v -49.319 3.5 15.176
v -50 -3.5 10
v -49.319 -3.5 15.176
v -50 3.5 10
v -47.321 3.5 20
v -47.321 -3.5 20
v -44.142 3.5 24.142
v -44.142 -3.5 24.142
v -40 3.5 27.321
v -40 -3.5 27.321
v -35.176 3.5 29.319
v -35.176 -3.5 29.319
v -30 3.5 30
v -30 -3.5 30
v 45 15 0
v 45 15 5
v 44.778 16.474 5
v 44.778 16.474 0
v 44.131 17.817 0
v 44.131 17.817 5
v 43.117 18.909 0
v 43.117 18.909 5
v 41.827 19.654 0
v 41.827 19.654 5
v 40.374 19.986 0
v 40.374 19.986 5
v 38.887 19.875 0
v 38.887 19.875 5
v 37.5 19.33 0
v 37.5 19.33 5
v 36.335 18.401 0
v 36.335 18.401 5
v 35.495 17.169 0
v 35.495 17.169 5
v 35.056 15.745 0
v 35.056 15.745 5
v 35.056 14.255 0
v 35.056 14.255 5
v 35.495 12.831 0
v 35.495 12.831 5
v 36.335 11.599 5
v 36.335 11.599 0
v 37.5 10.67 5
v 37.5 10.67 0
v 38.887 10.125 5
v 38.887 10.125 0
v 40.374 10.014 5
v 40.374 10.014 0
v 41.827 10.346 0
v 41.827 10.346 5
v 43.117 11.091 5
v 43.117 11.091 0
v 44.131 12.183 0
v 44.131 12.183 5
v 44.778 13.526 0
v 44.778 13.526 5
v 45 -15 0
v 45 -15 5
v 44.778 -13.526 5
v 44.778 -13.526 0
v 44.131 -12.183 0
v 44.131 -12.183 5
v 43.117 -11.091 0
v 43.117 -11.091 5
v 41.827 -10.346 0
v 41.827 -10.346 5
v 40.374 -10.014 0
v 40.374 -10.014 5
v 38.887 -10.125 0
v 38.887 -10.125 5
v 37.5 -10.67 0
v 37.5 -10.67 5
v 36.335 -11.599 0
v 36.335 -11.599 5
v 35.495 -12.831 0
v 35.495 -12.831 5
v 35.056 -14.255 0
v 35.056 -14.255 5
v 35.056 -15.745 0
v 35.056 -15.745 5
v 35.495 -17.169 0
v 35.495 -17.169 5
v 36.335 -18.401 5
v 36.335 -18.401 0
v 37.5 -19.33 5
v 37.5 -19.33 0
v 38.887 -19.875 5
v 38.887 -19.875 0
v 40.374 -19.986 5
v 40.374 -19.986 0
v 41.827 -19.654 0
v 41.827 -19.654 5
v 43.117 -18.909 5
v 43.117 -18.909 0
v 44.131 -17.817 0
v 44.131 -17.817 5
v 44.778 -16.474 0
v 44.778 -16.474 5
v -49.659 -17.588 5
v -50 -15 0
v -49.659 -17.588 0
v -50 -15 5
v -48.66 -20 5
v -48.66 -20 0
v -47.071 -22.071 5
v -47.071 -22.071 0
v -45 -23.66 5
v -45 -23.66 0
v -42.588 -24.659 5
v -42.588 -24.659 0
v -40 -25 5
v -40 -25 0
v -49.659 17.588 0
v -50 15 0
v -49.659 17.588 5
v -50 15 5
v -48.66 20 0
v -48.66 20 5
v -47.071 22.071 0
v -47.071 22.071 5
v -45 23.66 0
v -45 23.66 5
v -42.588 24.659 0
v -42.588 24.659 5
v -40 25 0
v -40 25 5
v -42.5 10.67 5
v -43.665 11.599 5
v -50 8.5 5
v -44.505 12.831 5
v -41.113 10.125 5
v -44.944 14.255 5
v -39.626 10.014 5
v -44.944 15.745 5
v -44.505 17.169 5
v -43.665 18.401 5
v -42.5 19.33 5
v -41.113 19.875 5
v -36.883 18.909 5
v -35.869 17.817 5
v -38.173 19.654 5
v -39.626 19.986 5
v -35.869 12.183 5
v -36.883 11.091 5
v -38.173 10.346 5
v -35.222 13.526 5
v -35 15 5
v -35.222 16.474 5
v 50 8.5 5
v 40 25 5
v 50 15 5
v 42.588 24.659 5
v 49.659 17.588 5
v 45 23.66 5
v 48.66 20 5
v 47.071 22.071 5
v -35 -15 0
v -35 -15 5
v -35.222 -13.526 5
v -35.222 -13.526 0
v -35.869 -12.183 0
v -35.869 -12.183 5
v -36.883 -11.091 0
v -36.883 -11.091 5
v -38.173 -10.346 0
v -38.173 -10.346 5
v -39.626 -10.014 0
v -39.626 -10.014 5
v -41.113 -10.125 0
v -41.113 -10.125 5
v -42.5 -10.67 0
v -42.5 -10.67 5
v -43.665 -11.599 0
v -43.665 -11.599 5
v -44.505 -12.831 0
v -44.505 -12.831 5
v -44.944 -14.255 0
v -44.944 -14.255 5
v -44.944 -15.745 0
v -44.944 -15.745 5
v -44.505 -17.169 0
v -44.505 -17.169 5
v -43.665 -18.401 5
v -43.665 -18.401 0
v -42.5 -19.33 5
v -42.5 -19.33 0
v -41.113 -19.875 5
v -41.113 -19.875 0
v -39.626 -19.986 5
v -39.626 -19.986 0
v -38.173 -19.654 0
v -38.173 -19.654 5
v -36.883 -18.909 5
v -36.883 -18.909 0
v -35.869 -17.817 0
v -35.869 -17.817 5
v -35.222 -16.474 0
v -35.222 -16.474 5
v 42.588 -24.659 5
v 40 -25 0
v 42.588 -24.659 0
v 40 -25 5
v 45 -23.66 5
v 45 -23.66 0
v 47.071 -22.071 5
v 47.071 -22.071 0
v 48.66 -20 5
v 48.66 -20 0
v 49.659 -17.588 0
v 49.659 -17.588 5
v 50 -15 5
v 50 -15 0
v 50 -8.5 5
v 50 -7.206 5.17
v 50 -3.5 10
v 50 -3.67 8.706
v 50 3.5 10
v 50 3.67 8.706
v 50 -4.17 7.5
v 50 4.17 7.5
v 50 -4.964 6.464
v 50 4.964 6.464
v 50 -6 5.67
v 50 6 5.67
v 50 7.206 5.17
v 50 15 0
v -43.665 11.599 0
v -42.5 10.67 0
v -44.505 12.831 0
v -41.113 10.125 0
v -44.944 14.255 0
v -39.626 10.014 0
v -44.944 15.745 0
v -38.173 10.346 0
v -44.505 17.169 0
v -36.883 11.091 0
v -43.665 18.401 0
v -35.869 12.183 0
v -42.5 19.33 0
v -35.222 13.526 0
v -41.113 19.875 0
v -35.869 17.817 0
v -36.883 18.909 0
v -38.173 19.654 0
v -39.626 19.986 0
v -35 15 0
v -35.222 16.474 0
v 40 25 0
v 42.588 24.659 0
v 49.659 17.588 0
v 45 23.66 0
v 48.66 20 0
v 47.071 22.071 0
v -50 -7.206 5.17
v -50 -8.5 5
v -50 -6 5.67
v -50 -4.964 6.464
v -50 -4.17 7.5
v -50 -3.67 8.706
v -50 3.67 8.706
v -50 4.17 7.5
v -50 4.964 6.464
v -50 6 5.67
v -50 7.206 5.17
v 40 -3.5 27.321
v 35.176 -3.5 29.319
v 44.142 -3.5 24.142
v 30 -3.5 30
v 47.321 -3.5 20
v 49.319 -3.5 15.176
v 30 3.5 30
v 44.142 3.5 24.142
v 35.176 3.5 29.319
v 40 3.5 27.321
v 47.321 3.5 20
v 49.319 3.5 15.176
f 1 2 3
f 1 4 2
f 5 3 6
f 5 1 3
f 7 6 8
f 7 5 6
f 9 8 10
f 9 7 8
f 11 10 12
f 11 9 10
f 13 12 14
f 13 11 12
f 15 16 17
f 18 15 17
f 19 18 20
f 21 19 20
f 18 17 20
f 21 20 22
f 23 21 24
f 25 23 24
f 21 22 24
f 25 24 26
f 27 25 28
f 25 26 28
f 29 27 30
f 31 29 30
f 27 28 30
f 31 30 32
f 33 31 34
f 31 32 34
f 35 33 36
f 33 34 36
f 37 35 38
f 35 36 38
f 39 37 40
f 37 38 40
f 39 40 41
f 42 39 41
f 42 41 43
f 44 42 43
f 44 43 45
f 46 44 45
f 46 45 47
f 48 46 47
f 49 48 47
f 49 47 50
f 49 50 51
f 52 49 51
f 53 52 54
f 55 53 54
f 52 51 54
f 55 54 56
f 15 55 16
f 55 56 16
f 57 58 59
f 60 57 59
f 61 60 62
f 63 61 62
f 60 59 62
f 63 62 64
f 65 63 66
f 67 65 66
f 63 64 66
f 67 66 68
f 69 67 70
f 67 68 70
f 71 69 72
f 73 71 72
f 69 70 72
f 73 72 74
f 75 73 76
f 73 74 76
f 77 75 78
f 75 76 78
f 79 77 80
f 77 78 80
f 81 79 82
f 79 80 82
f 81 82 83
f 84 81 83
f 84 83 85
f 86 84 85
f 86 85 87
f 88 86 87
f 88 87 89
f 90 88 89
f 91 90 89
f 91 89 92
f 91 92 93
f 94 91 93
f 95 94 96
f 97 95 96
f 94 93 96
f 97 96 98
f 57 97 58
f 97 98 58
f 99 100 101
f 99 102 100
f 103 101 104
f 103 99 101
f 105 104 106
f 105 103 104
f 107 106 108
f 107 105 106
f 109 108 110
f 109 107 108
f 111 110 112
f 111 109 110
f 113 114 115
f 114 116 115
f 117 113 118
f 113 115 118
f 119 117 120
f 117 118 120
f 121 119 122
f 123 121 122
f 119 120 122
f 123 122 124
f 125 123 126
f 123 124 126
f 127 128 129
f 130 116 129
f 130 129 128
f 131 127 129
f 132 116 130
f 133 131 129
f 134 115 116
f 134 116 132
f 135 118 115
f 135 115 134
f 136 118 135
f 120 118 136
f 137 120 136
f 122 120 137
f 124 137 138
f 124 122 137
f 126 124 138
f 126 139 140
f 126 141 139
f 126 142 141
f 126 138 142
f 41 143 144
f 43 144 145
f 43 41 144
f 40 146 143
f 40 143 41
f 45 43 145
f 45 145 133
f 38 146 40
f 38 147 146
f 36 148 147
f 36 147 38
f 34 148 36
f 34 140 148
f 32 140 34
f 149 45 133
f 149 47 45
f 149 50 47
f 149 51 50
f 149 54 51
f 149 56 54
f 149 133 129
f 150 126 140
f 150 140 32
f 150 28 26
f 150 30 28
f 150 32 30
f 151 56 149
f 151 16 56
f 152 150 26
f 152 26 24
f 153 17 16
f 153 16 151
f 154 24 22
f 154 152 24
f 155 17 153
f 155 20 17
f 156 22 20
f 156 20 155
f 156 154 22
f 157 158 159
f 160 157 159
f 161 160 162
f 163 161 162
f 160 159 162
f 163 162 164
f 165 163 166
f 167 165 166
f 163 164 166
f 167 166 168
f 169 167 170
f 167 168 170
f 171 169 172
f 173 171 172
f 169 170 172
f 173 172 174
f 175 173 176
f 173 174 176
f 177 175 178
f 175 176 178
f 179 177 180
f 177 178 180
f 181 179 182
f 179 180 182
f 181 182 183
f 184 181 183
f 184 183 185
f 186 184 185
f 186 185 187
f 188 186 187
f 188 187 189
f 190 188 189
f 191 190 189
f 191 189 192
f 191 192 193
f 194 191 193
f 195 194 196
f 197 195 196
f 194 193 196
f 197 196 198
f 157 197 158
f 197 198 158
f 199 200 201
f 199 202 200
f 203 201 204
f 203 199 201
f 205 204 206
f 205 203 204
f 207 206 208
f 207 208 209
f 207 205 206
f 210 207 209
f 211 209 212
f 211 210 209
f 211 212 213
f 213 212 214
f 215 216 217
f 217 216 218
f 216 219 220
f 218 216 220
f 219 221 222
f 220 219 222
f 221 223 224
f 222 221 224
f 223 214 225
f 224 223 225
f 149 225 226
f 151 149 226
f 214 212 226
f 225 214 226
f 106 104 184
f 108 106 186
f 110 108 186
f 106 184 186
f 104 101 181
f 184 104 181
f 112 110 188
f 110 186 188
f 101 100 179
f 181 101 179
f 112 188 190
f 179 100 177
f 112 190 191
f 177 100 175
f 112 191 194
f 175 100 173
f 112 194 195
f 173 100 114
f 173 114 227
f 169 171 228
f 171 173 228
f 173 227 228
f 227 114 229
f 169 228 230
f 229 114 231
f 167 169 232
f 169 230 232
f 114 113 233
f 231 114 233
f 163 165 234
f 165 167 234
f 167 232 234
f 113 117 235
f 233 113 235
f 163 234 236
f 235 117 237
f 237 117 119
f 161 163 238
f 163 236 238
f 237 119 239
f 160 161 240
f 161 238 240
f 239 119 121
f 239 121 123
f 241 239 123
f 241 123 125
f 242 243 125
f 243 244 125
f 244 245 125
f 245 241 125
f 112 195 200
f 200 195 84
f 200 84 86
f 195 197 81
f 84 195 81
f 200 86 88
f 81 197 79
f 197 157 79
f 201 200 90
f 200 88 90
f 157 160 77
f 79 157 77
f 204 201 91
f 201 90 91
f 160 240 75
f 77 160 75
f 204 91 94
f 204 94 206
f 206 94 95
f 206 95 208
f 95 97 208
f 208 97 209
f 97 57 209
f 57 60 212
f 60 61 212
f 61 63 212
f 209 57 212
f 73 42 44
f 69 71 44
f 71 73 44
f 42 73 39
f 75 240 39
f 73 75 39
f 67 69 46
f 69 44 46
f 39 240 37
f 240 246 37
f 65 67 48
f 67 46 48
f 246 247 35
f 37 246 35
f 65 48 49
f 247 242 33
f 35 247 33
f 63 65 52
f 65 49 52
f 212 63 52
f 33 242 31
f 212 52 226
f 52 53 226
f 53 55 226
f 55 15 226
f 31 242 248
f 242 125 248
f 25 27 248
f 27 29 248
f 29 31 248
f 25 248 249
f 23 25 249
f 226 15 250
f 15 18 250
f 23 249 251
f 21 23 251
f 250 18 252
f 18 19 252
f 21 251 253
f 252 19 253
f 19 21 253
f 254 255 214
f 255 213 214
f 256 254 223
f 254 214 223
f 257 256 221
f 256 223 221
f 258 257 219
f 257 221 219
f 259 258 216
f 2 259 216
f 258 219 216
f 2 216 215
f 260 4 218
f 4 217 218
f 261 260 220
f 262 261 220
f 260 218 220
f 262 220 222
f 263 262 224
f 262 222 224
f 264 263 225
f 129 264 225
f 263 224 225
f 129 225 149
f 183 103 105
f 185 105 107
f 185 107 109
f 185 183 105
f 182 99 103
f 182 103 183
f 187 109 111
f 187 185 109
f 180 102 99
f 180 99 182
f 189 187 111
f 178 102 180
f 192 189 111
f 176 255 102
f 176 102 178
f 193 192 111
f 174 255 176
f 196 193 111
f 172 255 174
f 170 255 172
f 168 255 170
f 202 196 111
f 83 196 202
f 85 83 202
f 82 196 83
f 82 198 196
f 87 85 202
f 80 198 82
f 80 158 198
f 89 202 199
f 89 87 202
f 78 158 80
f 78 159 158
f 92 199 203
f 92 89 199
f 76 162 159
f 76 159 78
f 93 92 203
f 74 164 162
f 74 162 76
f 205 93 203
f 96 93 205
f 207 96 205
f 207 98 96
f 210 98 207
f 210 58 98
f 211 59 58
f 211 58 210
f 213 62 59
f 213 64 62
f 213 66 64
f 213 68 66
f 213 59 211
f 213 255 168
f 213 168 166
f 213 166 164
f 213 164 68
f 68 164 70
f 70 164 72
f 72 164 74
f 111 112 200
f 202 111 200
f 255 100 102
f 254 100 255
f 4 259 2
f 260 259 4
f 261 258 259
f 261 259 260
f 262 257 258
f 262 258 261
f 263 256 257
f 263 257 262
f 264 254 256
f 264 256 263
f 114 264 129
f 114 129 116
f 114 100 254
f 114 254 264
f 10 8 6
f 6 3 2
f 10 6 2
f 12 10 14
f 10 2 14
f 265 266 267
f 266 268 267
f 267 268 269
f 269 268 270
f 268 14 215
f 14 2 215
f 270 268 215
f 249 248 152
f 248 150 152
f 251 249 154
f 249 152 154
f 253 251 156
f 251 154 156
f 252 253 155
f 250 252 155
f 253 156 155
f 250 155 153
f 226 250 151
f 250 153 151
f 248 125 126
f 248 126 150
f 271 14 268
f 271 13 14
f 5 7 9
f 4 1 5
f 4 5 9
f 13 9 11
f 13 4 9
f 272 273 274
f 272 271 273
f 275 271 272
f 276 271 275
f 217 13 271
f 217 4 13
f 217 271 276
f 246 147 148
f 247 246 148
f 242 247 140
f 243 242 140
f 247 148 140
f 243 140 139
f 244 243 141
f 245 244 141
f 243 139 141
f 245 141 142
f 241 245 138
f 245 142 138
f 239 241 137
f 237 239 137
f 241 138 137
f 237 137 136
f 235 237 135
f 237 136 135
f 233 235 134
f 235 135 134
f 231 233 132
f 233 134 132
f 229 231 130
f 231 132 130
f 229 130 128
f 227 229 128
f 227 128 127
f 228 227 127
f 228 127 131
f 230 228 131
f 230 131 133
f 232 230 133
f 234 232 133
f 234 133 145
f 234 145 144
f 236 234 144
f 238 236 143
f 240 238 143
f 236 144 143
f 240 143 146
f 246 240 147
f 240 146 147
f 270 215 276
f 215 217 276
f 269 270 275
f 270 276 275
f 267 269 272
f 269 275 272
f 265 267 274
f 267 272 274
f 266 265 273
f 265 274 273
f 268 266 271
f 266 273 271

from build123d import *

# Parameters (mm, degrees)
SKETCH_W     = 100
SKETCH_H     = 50
PAD_DEPTH    = 5
SKETCH001_R  = 5
POCKET_DEPTH = 5
SKETCH002_W  = 100
SKETCH002_H  = 7
PAD001_DEPTH = 25
FILLET_R     = 20
FILLET001_R  = 10
FILLET002_R  = 5


with BuildPart() as part:
    # Sketch → Pad (new body)
    with BuildSketch(Plane.XY):
        Rectangle(SKETCH_W, SKETCH_H)
    extrude(amount=PAD_DEPTH)

    # Sketch001 (on Face6 of Pad) → Pocket (cut)
    with BuildSketch(Plane.XY.offset(5)):
        with Locations((-40, 15)):
            Circle(SKETCH001_R)
        with Locations((40, 15)):
            Circle(SKETCH001_R)
        with Locations((40, -15)):
            Circle(SKETCH001_R)
        with Locations((-40, -15)):
            Circle(SKETCH001_R)
    extrude(amount=-POCKET_DEPTH, mode=Mode.SUBTRACT)

    # Sketch002 (on Face5 of Pocket) → Pad001 (join)
    with BuildSketch(Plane.XY.offset(5)):
        Rectangle(SKETCH002_W, SKETCH002_H)
    extrude(amount=PAD001_DEPTH)

    # Fillet
    fillet_edges = [part.edges().sort_by_distance(p)[0] for p in [
        (-50, 0, 30),
        (50, 0, 30),
    ]]
    fillet(fillet_edges, radius=FILLET_R)

    # Fillet001
    fillet001_edges = [part.edges().sort_by_distance(p)[0] for p in [
        (50, -25, 2.5),
        (-50, -25, 2.5),
        (-50, 25, 2.5),
        (50, 25, 2.5),
    ]]
    fillet(fillet001_edges, radius=FILLET001_R)

    # Fillet002
    fillet002_edges = [part.edges().sort_by_distance(p)[0] for p in [
        (0, -3.5, 5),
        (0, 3.5, 5),
    ]]
    fillet(fillet002_edges, radius=FILLET002_R)


solid = part.part
